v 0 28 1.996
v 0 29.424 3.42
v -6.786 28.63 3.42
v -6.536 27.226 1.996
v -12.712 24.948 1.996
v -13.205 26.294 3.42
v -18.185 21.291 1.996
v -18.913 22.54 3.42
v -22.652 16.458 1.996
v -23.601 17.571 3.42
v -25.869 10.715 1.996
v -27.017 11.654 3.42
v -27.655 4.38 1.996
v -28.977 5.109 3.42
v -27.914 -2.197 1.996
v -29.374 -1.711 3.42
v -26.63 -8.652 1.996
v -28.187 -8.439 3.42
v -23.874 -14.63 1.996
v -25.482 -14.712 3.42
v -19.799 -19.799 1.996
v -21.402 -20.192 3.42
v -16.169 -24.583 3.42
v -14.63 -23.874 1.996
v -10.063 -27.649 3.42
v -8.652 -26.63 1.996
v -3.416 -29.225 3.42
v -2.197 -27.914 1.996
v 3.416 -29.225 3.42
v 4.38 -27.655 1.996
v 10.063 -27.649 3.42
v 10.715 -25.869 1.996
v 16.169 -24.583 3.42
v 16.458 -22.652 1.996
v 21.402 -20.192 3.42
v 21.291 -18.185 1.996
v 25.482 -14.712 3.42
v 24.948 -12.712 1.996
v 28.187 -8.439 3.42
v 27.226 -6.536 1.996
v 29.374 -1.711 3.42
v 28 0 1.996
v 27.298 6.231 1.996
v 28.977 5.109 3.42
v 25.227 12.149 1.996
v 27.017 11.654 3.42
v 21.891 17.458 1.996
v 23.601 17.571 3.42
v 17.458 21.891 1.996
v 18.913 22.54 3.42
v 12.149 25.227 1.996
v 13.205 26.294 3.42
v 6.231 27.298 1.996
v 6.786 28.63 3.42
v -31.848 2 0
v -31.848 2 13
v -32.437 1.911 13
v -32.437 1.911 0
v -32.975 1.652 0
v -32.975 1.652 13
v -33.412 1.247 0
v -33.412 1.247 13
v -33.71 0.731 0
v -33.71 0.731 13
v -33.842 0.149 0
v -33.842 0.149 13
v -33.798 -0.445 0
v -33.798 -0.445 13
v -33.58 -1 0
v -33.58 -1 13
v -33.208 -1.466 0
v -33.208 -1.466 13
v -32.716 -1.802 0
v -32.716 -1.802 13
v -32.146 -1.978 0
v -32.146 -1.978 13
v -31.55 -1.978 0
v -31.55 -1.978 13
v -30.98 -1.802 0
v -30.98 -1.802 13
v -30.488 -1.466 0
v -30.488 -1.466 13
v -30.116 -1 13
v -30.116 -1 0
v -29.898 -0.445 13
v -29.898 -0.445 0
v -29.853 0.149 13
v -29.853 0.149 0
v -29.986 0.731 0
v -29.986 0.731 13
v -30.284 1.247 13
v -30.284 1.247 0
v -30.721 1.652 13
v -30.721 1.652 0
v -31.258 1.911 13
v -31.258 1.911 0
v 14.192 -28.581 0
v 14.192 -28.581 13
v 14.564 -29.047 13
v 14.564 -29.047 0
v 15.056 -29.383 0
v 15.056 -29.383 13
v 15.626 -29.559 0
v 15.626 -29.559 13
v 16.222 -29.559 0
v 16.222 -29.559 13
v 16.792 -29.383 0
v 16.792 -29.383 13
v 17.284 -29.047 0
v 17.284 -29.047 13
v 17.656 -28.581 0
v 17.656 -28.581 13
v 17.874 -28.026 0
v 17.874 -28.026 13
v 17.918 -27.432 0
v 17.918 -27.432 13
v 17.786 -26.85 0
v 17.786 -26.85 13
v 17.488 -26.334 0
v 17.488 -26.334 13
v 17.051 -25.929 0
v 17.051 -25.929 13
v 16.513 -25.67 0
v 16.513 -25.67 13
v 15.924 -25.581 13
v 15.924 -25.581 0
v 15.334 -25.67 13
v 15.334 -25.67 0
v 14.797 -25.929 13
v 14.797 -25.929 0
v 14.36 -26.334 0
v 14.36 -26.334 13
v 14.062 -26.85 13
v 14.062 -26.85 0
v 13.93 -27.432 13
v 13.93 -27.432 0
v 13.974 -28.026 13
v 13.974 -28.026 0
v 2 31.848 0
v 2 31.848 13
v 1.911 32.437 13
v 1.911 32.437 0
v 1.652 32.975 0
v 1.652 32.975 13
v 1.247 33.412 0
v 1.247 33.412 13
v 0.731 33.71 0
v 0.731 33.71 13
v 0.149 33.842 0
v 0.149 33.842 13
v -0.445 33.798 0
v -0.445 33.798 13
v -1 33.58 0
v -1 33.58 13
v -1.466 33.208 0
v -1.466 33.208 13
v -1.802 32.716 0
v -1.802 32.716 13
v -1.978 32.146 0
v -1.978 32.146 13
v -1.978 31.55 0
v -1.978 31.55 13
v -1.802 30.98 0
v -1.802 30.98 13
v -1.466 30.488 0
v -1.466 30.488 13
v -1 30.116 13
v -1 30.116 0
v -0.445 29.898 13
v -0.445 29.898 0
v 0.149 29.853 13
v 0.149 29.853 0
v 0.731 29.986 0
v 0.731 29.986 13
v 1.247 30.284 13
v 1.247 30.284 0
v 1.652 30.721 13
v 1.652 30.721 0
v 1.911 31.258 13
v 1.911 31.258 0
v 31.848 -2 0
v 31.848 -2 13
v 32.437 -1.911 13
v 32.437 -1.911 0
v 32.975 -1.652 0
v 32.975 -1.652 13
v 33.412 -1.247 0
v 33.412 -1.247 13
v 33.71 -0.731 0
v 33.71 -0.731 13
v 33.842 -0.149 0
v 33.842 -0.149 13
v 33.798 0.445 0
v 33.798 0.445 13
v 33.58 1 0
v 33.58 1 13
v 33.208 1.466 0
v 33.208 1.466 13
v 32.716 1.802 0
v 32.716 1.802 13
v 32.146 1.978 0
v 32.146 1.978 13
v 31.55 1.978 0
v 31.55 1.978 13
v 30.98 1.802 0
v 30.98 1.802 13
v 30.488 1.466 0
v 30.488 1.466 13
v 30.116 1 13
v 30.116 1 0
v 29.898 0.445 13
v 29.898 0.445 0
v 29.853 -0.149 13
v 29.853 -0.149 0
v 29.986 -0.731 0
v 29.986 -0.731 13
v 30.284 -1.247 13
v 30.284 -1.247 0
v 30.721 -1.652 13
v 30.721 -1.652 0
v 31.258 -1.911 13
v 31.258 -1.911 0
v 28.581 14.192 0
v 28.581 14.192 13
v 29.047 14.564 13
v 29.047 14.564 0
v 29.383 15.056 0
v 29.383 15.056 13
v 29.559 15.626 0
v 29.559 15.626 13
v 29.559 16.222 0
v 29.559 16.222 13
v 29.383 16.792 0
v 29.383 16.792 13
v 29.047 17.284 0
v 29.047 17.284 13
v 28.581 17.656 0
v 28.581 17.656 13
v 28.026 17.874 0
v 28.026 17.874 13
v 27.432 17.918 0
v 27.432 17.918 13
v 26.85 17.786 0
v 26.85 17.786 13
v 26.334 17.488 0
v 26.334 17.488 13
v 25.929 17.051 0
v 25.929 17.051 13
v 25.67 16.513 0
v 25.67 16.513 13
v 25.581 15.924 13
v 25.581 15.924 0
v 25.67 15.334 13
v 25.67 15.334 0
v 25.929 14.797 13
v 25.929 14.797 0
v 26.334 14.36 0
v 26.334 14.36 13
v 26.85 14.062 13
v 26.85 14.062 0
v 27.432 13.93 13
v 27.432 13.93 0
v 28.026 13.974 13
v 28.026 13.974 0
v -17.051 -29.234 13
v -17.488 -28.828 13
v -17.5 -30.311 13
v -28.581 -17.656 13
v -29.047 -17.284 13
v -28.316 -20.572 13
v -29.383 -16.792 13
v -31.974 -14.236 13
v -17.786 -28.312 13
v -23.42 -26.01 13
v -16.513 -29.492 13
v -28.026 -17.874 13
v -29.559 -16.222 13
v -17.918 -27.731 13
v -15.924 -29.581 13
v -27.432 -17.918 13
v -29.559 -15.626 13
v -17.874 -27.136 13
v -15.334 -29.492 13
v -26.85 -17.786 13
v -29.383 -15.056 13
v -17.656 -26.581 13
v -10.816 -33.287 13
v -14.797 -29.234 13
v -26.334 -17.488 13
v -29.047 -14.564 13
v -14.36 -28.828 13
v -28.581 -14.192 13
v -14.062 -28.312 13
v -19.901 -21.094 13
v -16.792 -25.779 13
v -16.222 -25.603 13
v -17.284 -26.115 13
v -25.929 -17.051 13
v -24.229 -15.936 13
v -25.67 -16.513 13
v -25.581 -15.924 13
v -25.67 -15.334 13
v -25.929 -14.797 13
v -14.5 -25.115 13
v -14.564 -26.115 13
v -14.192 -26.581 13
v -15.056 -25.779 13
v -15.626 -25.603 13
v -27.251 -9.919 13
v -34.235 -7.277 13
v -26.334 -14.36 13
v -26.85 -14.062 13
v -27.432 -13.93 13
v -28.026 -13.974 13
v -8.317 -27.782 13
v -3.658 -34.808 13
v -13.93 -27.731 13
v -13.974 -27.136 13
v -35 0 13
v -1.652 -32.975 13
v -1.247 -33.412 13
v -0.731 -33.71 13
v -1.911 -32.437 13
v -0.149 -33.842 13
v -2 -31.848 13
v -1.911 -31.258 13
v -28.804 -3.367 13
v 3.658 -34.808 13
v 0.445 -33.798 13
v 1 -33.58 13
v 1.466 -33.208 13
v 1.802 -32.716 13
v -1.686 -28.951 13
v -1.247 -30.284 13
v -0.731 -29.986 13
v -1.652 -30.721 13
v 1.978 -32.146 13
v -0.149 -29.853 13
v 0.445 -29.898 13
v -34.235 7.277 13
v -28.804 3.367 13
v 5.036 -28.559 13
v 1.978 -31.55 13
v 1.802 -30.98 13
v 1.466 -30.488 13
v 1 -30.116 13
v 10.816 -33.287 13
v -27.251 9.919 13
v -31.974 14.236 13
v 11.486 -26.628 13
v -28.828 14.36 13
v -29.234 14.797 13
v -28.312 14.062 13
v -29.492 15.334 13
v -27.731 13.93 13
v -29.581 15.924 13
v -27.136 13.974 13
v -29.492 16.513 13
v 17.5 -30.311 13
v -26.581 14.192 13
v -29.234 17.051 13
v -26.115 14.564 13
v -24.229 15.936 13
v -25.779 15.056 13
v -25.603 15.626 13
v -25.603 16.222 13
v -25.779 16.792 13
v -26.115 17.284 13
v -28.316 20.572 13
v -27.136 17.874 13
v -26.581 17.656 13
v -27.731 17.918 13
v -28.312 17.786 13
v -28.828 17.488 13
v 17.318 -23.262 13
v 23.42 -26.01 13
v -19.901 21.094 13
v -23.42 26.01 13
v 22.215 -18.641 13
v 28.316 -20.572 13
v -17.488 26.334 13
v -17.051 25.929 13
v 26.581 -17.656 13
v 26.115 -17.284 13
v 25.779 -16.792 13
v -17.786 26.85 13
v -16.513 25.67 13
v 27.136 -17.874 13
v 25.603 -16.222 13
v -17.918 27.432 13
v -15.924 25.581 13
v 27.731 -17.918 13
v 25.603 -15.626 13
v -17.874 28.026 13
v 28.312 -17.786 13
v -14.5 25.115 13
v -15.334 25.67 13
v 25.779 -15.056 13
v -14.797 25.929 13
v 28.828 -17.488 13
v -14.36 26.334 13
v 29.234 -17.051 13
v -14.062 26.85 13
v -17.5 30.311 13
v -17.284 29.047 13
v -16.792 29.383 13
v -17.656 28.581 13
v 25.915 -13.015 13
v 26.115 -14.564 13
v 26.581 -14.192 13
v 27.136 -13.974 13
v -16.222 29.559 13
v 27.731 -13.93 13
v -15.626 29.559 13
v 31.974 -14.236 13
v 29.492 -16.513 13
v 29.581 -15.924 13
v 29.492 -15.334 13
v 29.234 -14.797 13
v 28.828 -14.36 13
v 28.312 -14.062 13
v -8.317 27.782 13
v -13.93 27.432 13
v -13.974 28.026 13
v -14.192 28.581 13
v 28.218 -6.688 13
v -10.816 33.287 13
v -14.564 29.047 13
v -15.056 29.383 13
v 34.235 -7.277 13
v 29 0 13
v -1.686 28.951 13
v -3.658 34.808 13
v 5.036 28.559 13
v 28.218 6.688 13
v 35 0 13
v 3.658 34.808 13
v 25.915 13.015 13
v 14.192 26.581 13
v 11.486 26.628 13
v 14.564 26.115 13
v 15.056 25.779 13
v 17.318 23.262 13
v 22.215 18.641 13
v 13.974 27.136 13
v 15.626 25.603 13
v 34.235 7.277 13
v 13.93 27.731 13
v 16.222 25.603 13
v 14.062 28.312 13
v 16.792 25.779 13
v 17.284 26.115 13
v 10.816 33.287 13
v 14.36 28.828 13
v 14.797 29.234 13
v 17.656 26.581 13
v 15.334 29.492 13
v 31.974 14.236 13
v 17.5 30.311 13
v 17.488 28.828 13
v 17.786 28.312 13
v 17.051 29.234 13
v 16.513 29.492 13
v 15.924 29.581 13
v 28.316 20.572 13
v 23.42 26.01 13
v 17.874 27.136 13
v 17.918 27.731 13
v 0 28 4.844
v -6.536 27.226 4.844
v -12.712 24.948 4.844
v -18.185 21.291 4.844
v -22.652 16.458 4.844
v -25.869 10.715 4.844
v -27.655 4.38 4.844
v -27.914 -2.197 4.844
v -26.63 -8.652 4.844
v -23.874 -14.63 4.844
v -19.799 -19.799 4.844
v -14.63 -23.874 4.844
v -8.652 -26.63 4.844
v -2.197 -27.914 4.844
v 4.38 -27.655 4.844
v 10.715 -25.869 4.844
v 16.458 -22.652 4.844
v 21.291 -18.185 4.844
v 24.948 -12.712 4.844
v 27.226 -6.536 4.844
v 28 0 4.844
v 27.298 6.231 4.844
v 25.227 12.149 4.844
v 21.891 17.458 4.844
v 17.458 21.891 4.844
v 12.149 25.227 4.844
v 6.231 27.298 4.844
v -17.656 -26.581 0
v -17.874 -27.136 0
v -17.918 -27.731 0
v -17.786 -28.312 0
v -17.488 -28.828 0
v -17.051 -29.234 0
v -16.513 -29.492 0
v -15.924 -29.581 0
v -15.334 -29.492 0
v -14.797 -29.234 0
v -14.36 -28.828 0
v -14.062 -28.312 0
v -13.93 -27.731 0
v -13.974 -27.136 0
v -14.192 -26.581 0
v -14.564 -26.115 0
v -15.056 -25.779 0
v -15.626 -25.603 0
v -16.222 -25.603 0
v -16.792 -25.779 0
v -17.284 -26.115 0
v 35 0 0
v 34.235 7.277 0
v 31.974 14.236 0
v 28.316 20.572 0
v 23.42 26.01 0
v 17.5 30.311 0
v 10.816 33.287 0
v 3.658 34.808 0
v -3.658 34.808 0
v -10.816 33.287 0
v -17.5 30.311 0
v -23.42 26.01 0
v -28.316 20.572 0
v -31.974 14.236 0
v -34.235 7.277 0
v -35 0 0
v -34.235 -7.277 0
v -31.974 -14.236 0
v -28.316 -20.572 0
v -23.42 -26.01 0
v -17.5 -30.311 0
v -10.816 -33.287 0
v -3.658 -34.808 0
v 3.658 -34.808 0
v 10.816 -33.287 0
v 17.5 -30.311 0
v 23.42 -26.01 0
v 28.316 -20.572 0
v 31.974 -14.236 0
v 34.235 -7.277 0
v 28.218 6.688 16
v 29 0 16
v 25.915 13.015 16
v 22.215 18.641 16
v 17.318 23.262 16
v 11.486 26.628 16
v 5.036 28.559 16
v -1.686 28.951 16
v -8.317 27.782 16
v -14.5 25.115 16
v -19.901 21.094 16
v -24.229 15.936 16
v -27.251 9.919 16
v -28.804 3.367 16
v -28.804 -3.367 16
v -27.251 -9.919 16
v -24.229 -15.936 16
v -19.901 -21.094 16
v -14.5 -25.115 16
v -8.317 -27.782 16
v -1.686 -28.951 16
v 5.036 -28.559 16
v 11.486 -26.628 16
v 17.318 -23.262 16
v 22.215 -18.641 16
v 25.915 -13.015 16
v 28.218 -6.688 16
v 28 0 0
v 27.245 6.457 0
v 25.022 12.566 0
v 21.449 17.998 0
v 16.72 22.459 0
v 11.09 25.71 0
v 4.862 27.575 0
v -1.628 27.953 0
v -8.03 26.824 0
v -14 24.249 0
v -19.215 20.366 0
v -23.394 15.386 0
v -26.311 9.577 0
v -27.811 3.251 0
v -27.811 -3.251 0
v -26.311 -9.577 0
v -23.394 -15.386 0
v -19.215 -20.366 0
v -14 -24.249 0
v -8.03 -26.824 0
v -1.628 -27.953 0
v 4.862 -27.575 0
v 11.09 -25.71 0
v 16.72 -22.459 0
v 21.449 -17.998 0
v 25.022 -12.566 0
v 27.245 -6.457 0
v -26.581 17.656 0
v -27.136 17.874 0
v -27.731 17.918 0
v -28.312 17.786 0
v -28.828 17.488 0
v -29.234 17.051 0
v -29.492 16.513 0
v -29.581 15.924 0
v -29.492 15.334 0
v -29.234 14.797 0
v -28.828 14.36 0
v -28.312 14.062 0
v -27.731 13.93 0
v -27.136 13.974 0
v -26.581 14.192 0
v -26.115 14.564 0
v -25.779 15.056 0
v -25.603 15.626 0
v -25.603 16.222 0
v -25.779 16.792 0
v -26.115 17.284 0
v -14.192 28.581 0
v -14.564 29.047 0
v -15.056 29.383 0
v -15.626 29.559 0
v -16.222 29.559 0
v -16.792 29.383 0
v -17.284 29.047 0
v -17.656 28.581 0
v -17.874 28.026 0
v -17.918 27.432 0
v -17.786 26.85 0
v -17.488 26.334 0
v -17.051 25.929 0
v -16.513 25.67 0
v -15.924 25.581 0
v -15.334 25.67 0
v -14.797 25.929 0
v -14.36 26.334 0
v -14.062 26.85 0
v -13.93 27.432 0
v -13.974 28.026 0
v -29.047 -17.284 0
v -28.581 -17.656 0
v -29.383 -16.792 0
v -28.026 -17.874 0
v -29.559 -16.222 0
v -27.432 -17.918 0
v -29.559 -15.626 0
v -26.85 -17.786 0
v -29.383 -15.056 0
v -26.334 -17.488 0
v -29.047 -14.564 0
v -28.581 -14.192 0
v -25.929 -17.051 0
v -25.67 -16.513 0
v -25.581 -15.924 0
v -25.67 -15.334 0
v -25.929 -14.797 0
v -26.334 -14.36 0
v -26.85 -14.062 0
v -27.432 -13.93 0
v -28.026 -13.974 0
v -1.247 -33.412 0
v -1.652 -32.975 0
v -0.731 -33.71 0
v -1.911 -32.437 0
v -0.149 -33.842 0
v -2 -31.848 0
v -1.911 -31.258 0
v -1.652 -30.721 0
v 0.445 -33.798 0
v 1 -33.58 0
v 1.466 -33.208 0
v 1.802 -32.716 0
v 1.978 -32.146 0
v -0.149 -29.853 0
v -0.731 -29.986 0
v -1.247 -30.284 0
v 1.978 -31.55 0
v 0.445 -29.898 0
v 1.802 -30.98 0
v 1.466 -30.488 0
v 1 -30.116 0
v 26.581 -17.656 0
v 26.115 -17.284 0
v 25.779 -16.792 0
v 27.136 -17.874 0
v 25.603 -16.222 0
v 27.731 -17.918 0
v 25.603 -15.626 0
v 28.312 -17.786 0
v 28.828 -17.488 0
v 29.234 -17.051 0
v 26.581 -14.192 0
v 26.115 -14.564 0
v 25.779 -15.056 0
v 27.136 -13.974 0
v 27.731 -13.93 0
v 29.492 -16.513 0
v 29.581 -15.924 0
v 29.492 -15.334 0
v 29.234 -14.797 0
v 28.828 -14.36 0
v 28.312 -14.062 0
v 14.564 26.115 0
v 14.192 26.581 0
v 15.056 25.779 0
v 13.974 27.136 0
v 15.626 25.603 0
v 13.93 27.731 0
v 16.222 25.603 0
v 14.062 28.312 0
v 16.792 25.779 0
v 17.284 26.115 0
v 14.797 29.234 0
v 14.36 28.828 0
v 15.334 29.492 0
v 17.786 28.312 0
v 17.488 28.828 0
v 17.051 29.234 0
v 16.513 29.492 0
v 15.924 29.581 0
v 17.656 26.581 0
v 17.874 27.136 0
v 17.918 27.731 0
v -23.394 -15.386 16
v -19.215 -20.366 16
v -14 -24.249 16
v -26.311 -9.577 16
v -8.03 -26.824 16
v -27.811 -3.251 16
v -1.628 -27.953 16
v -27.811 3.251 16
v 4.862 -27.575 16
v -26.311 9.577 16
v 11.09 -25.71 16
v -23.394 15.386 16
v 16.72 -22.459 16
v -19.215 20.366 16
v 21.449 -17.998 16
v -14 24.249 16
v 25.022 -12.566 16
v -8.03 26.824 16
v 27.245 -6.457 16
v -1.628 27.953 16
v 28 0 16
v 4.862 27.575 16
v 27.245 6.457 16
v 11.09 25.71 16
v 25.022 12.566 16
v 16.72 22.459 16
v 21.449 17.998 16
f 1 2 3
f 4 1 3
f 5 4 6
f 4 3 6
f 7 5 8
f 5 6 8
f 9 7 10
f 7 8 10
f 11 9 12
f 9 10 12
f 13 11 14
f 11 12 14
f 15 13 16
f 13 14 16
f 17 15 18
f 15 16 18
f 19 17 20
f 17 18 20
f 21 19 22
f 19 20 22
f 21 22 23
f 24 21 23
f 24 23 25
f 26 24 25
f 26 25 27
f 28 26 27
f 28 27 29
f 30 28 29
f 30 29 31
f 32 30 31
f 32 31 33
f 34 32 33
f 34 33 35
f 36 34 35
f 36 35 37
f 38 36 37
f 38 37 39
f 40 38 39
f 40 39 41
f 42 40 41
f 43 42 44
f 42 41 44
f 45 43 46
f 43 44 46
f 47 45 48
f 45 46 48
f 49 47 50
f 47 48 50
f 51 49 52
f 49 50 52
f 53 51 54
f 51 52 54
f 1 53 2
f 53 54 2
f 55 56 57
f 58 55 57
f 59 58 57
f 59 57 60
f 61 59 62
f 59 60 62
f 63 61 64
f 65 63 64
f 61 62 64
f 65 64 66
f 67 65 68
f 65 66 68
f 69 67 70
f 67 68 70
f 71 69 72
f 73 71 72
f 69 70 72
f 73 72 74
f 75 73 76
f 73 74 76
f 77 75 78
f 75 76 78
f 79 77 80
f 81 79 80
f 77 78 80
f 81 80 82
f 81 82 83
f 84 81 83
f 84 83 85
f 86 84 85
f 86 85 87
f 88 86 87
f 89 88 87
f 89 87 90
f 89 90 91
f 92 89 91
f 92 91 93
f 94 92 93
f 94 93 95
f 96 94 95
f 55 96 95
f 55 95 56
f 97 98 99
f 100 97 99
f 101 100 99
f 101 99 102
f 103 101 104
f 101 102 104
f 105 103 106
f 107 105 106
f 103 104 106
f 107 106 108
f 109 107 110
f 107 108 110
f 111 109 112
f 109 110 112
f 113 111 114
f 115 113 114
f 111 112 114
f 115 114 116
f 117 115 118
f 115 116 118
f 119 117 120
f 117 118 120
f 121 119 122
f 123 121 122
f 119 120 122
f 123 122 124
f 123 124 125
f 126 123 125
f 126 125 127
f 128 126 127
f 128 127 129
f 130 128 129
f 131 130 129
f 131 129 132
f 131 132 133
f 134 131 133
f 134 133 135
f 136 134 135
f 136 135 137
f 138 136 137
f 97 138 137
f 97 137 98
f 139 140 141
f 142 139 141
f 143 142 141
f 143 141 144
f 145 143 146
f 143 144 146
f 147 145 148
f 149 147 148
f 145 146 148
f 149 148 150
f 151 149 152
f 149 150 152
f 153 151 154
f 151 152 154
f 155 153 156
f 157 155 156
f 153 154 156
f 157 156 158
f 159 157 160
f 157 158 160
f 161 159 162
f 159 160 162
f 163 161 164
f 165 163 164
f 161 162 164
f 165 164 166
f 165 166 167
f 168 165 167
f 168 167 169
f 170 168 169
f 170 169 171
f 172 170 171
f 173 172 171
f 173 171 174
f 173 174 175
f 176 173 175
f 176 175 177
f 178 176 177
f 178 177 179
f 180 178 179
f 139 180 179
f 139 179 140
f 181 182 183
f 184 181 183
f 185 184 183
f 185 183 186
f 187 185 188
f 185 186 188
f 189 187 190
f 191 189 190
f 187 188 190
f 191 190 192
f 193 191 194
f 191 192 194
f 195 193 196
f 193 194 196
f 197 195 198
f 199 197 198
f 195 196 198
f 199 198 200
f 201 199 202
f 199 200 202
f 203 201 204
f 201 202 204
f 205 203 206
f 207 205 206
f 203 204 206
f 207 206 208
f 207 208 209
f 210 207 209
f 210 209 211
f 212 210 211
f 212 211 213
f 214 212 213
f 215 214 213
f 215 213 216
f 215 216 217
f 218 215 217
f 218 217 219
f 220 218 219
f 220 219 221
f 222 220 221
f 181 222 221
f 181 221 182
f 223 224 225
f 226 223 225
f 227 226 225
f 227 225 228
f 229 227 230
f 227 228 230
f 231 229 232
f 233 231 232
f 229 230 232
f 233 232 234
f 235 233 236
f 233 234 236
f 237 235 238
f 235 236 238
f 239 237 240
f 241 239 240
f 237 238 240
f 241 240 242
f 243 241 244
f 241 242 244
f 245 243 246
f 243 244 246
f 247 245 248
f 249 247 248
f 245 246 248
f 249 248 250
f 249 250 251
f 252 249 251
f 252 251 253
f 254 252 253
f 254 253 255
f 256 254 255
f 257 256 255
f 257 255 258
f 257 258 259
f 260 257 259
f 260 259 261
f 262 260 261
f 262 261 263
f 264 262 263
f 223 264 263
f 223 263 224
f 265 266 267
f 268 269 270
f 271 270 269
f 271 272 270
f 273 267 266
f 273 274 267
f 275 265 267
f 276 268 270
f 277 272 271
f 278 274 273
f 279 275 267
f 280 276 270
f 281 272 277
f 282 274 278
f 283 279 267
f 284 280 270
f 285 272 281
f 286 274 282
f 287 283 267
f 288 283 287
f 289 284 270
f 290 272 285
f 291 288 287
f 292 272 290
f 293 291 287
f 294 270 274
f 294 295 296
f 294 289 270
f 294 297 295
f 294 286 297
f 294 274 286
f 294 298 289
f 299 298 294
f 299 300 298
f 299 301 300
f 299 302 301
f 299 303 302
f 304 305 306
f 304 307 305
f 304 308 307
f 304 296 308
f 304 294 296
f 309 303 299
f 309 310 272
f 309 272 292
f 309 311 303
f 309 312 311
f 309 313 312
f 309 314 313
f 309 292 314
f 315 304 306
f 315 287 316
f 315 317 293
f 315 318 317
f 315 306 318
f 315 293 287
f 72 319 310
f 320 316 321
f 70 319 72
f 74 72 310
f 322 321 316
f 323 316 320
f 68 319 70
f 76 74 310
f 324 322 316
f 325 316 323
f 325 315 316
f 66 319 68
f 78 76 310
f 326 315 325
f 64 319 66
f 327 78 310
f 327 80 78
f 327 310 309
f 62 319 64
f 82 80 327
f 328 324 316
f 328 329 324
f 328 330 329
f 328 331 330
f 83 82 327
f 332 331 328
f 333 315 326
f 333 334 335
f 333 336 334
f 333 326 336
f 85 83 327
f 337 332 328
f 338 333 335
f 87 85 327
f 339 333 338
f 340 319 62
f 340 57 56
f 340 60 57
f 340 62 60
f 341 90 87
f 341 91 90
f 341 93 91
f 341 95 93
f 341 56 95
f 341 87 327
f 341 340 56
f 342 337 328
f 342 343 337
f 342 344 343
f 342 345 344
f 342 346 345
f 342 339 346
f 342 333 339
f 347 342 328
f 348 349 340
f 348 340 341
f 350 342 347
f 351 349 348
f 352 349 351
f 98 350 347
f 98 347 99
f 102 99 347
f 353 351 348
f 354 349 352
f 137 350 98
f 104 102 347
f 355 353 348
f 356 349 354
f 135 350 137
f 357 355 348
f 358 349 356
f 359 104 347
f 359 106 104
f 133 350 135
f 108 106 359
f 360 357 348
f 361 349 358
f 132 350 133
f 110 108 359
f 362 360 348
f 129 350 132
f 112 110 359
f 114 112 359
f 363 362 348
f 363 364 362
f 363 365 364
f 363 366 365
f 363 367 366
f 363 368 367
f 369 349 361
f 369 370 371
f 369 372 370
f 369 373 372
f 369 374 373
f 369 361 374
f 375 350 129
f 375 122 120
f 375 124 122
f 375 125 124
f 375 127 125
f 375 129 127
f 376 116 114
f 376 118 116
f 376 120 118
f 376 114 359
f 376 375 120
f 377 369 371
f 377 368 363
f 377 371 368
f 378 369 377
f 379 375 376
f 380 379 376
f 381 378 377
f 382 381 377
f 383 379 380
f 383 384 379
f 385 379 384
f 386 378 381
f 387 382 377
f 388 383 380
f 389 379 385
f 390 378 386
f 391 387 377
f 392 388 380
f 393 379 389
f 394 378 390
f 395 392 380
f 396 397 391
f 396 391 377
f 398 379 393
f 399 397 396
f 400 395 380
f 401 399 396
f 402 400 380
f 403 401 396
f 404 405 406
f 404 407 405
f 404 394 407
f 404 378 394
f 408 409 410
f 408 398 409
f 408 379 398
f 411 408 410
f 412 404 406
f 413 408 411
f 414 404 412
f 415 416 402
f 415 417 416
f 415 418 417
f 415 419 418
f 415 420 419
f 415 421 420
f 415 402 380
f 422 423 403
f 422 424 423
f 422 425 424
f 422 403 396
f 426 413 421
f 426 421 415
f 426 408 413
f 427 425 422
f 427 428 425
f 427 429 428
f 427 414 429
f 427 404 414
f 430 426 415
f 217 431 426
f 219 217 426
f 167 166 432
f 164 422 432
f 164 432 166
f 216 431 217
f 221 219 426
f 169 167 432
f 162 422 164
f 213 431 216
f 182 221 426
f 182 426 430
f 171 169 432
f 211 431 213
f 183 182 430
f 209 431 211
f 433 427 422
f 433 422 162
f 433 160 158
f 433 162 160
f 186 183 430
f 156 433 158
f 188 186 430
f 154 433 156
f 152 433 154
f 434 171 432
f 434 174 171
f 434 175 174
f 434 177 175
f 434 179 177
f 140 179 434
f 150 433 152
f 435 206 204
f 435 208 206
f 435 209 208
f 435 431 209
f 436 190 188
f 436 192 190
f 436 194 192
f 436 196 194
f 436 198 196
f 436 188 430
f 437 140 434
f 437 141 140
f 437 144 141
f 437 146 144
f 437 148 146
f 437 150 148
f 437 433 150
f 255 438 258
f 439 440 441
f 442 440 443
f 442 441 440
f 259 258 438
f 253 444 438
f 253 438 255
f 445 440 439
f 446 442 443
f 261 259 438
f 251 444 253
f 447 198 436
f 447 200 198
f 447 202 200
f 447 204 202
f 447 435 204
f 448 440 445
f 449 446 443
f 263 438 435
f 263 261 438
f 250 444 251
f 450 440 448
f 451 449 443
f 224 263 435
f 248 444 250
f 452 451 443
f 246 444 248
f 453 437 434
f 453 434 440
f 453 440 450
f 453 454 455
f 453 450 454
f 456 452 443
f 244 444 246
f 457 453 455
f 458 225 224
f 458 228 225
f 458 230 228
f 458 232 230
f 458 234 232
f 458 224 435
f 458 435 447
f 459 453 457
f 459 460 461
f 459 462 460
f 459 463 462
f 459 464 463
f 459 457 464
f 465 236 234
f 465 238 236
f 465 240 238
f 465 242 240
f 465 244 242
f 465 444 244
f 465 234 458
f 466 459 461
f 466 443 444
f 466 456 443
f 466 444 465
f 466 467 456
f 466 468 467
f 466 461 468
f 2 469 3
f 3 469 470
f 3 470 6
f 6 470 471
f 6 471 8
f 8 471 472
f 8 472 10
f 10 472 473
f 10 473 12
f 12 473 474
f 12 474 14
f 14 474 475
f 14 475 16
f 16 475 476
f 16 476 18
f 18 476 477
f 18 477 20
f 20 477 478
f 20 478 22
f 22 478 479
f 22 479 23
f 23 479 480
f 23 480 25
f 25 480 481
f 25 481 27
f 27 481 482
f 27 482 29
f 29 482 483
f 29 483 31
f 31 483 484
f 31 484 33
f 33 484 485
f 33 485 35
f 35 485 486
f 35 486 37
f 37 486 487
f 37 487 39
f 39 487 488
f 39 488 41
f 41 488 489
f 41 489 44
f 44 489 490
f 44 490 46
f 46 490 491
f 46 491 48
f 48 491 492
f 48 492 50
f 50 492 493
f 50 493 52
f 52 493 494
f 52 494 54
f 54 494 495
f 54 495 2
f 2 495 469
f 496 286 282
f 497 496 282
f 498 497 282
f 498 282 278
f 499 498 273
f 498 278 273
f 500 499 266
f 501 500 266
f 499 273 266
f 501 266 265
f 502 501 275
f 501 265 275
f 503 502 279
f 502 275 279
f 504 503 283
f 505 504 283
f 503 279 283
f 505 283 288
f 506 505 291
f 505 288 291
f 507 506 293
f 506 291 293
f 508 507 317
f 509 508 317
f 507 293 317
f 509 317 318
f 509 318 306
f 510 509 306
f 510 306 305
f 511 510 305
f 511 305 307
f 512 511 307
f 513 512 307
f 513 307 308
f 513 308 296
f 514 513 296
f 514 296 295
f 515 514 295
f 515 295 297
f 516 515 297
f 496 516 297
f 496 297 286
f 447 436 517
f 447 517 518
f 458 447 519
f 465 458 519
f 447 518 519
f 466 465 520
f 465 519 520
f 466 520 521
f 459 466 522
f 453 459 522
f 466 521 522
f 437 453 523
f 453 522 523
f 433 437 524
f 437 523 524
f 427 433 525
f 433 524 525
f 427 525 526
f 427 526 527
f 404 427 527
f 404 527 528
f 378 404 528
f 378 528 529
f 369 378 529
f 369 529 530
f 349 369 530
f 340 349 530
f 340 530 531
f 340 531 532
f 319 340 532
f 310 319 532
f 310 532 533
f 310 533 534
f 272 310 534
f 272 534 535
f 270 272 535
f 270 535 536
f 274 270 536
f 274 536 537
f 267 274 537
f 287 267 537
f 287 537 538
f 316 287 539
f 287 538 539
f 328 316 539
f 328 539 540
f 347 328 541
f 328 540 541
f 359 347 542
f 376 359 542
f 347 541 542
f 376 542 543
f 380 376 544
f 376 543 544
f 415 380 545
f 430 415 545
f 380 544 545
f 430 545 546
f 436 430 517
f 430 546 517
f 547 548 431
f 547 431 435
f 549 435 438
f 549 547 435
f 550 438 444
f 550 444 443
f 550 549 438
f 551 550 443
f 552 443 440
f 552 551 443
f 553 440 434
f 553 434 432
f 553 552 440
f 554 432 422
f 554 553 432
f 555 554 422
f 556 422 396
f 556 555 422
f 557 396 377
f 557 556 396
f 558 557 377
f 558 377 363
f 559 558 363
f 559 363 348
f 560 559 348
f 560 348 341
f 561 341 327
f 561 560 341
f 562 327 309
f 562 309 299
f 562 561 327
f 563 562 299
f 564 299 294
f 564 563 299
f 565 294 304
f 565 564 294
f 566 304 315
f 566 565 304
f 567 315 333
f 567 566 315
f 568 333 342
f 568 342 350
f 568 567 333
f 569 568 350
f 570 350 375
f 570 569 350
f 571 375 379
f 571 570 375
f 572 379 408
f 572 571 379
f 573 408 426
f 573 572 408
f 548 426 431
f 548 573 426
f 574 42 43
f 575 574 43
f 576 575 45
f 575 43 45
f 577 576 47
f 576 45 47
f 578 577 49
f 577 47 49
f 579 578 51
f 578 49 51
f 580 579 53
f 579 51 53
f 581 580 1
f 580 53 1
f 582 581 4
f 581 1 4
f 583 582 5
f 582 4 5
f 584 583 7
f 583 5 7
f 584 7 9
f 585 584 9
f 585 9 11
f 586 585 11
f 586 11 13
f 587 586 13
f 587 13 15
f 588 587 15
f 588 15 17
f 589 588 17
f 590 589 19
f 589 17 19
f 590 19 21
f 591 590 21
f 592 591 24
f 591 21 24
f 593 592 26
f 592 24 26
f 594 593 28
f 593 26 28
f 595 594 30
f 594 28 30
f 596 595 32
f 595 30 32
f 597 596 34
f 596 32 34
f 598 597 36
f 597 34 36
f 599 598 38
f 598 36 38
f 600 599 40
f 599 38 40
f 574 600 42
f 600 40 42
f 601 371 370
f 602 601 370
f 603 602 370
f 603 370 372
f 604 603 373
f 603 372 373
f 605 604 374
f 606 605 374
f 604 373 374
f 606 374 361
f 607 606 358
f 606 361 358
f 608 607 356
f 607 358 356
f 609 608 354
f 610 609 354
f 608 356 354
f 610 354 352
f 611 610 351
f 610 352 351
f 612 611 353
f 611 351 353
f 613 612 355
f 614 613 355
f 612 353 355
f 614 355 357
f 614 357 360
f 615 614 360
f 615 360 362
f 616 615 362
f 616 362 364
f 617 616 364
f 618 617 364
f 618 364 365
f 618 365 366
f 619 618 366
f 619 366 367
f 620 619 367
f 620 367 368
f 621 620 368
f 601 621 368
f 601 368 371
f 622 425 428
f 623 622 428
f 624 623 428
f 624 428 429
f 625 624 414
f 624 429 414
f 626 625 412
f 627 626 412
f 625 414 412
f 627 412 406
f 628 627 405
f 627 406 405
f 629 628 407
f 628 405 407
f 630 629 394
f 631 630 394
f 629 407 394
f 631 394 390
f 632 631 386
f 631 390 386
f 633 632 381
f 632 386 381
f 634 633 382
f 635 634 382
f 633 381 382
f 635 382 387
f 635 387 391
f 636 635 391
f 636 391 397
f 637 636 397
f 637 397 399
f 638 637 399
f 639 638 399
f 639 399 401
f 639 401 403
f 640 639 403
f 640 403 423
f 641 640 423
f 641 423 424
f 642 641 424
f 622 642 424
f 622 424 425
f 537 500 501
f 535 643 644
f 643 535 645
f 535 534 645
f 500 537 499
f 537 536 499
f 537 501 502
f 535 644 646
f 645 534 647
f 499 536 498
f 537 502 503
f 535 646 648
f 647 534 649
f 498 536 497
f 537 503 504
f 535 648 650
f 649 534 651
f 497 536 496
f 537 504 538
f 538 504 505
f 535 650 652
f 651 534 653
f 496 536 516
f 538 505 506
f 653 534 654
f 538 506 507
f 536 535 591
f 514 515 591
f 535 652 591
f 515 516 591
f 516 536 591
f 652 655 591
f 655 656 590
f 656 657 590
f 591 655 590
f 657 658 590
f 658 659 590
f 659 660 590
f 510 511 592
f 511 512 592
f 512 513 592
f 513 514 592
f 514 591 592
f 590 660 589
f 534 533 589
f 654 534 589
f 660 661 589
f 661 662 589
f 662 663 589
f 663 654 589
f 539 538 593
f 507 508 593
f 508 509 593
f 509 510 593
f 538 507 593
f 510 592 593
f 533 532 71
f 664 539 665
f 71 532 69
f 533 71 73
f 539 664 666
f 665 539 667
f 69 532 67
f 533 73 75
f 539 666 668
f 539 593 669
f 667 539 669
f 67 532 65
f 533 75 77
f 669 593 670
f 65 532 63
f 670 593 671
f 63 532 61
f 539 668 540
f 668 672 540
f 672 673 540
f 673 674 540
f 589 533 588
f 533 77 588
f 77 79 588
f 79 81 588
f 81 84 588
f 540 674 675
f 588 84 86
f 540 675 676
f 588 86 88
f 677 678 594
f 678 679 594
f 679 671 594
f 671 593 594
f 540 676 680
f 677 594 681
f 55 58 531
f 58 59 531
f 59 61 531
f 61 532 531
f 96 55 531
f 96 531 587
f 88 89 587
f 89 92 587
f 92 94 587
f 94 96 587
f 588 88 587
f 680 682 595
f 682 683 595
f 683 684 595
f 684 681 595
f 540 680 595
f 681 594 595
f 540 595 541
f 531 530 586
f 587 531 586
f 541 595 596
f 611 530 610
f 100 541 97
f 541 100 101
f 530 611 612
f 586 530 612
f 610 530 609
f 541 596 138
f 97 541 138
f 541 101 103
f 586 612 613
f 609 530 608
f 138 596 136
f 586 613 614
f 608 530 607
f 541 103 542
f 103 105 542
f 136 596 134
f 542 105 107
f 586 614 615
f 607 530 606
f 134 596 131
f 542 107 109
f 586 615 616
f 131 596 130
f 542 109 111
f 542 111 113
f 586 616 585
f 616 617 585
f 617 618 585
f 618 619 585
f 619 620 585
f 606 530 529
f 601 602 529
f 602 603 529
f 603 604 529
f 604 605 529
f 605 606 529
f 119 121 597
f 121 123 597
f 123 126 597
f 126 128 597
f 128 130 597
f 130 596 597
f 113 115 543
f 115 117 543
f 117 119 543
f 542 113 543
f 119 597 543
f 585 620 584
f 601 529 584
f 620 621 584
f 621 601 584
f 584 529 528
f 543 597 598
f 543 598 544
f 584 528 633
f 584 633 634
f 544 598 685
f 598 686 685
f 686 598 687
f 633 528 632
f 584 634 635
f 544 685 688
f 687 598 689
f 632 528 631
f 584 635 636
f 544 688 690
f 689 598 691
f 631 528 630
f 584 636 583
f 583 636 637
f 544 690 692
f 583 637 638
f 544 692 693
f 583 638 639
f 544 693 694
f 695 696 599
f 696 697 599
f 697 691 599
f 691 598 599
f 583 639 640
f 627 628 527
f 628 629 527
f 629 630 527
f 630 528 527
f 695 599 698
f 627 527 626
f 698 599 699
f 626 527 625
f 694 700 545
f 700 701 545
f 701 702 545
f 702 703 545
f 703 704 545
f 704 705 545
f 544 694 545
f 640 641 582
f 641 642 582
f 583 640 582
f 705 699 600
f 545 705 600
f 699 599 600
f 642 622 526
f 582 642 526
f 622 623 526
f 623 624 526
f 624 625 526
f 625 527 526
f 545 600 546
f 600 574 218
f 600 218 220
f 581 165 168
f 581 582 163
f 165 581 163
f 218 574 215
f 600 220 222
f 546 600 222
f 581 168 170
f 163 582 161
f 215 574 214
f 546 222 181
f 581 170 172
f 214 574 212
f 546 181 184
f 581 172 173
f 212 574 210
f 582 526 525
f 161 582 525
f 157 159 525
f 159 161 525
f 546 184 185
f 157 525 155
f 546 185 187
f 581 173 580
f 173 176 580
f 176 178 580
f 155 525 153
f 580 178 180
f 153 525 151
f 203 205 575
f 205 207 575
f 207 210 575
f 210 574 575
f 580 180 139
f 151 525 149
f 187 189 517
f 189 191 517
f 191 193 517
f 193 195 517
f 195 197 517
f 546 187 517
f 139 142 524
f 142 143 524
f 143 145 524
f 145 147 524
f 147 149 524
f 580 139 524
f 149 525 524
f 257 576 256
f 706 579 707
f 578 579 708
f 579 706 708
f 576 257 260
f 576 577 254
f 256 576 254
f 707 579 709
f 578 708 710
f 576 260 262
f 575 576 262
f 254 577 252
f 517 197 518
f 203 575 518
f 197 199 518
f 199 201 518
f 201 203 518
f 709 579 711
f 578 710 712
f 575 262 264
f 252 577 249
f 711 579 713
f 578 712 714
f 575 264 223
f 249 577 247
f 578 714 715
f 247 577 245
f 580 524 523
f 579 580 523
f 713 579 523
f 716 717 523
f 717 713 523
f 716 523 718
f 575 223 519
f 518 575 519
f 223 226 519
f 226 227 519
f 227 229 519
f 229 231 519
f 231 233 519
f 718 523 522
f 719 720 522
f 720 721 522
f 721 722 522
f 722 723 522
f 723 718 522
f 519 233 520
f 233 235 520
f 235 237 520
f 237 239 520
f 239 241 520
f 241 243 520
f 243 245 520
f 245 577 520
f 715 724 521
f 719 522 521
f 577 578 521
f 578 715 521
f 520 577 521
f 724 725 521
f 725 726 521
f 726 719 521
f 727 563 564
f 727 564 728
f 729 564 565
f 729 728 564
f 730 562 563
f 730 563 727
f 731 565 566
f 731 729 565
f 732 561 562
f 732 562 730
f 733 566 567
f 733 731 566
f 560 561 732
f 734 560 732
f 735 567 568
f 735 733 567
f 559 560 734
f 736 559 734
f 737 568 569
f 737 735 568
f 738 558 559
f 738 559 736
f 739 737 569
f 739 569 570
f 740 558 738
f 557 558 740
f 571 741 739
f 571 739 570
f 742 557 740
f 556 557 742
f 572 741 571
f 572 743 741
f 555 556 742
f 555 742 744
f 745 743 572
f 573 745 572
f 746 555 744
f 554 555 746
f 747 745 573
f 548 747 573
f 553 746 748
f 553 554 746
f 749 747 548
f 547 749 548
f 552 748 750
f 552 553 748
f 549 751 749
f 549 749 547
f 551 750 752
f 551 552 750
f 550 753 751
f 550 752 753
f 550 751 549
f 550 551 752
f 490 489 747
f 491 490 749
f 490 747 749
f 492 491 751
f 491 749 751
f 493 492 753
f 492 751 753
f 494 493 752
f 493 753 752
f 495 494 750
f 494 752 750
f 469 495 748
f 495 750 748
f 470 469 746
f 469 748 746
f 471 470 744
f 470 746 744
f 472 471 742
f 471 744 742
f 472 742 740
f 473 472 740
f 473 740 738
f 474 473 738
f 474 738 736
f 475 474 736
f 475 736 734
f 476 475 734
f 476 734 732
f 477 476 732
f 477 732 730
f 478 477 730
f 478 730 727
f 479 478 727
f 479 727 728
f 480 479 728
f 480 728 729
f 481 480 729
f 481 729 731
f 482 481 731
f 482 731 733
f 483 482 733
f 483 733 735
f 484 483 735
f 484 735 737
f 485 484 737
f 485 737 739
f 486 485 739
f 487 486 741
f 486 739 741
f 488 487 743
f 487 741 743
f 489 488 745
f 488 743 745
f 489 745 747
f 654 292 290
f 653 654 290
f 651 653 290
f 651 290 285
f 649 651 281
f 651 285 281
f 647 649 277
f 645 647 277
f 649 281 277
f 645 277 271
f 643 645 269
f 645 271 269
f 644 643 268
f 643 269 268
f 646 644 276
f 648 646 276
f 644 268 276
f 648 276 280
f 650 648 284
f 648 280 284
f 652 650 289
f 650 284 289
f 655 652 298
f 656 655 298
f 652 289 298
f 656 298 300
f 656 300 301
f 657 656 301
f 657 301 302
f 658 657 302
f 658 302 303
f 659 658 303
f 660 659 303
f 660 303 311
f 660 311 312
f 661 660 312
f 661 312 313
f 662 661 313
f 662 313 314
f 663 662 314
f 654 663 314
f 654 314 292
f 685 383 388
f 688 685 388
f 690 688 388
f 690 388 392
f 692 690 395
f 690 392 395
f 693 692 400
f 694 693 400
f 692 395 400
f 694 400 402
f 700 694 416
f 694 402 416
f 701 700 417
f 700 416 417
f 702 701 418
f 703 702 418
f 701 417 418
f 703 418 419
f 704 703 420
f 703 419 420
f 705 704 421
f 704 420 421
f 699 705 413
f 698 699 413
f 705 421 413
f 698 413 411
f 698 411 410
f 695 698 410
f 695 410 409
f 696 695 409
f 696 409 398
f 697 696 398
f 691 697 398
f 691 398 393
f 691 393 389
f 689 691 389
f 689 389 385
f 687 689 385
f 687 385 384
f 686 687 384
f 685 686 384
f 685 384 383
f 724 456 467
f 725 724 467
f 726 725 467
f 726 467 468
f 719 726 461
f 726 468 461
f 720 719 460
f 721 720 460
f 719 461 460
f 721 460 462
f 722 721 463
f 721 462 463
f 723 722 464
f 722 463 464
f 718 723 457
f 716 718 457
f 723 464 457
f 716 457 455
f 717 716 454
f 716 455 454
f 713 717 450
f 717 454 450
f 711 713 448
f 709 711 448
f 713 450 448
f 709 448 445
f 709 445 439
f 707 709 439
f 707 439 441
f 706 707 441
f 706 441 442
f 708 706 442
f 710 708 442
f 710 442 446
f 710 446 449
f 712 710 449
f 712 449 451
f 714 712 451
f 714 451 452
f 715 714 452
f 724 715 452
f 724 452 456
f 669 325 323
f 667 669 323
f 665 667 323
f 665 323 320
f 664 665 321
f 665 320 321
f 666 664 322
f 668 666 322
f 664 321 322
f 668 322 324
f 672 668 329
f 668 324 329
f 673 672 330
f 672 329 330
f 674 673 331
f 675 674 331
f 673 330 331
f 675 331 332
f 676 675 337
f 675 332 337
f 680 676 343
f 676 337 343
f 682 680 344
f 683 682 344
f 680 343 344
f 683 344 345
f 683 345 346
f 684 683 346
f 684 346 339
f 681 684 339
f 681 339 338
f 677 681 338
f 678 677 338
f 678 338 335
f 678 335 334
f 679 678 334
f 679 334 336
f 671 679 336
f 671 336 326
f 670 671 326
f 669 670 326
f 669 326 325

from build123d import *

# Parameters (mm, degrees)
SKETCH_1_R               = 35
EXTRUDE_1_DEPTH          = 16
SKETCH_2_R               = 35
SKETCH_2_R_2             = 29
CUT_EXTRUDE_1_DEPTH      = 3
SKETCH_3_R               = 28
CUT_EXTRUDE_2_DEPTH      = 17
SKETCH_4_R               = 2
CUT_EXTRUDE_3_DEPTH      = 14
PATTERN_CIRCULAR_1_COUNT = 12


with BuildPart() as part:
    # 草图1 → 凸台-拉伸1 (new body)
    with BuildSketch(Plane.XY):
        Circle(SKETCH_1_R)
    extrude(amount=EXTRUDE_1_DEPTH)

    # 草图2 → 切除-拉伸1 (cut)
    with BuildSketch(Plane.XY.offset(16)):
        Circle(SKETCH_2_R)
        Circle(SKETCH_2_R_2, mode=Mode.SUBTRACT)
    extrude(amount=-CUT_EXTRUDE_1_DEPTH, mode=Mode.SUBTRACT)

    # 草图3 → 切除-拉伸2 (cut, through all)
    with BuildSketch(Plane.XY.offset(16)):
        Circle(SKETCH_3_R)
    extrude(amount=-CUT_EXTRUDE_2_DEPTH, mode=Mode.SUBTRACT)

    # 草图4 → 切除-拉伸3 (cut, through all)
    with BuildSketch(Plane.XY.offset(13)):
        with Locations((0, 31.847890671)):
            Circle(SKETCH_4_R)
    cut_extrude_3 = extrude(amount=-CUT_EXTRUDE_3_DEPTH, mode=Mode.SUBTRACT)

    # 阵列(圆周)1: 切除-拉伸3 ×12 about axis
    pattern_circular_1_axis = Axis((0, 0, 0), (0, 0, 1))
    for i in range(1, PATTERN_CIRCULAR_1_COUNT):
        add(cut_extrude_3.rotate(pattern_circular_1_axis, i * 360 / PATTERN_CIRCULAR_1_COUNT), mode=Mode.SUBTRACT)

    # 草图5 → 切除-旋转3 (revolve, cut)
    with BuildSketch(Plane(origin=(0, 0, 0), x_dir=(0, 0, -1), z_dir=(1, 0, 0))):
        Polygon((-4.855352657, 27.98817223), (-1.98280478, 27.986477885), (-3.419925891, 29.423598996), align=None)
    revolve(axis=Axis((0, 0, 0), (0, 0, 1)), mode=Mode.SUBTRACT)


solid = part.part
